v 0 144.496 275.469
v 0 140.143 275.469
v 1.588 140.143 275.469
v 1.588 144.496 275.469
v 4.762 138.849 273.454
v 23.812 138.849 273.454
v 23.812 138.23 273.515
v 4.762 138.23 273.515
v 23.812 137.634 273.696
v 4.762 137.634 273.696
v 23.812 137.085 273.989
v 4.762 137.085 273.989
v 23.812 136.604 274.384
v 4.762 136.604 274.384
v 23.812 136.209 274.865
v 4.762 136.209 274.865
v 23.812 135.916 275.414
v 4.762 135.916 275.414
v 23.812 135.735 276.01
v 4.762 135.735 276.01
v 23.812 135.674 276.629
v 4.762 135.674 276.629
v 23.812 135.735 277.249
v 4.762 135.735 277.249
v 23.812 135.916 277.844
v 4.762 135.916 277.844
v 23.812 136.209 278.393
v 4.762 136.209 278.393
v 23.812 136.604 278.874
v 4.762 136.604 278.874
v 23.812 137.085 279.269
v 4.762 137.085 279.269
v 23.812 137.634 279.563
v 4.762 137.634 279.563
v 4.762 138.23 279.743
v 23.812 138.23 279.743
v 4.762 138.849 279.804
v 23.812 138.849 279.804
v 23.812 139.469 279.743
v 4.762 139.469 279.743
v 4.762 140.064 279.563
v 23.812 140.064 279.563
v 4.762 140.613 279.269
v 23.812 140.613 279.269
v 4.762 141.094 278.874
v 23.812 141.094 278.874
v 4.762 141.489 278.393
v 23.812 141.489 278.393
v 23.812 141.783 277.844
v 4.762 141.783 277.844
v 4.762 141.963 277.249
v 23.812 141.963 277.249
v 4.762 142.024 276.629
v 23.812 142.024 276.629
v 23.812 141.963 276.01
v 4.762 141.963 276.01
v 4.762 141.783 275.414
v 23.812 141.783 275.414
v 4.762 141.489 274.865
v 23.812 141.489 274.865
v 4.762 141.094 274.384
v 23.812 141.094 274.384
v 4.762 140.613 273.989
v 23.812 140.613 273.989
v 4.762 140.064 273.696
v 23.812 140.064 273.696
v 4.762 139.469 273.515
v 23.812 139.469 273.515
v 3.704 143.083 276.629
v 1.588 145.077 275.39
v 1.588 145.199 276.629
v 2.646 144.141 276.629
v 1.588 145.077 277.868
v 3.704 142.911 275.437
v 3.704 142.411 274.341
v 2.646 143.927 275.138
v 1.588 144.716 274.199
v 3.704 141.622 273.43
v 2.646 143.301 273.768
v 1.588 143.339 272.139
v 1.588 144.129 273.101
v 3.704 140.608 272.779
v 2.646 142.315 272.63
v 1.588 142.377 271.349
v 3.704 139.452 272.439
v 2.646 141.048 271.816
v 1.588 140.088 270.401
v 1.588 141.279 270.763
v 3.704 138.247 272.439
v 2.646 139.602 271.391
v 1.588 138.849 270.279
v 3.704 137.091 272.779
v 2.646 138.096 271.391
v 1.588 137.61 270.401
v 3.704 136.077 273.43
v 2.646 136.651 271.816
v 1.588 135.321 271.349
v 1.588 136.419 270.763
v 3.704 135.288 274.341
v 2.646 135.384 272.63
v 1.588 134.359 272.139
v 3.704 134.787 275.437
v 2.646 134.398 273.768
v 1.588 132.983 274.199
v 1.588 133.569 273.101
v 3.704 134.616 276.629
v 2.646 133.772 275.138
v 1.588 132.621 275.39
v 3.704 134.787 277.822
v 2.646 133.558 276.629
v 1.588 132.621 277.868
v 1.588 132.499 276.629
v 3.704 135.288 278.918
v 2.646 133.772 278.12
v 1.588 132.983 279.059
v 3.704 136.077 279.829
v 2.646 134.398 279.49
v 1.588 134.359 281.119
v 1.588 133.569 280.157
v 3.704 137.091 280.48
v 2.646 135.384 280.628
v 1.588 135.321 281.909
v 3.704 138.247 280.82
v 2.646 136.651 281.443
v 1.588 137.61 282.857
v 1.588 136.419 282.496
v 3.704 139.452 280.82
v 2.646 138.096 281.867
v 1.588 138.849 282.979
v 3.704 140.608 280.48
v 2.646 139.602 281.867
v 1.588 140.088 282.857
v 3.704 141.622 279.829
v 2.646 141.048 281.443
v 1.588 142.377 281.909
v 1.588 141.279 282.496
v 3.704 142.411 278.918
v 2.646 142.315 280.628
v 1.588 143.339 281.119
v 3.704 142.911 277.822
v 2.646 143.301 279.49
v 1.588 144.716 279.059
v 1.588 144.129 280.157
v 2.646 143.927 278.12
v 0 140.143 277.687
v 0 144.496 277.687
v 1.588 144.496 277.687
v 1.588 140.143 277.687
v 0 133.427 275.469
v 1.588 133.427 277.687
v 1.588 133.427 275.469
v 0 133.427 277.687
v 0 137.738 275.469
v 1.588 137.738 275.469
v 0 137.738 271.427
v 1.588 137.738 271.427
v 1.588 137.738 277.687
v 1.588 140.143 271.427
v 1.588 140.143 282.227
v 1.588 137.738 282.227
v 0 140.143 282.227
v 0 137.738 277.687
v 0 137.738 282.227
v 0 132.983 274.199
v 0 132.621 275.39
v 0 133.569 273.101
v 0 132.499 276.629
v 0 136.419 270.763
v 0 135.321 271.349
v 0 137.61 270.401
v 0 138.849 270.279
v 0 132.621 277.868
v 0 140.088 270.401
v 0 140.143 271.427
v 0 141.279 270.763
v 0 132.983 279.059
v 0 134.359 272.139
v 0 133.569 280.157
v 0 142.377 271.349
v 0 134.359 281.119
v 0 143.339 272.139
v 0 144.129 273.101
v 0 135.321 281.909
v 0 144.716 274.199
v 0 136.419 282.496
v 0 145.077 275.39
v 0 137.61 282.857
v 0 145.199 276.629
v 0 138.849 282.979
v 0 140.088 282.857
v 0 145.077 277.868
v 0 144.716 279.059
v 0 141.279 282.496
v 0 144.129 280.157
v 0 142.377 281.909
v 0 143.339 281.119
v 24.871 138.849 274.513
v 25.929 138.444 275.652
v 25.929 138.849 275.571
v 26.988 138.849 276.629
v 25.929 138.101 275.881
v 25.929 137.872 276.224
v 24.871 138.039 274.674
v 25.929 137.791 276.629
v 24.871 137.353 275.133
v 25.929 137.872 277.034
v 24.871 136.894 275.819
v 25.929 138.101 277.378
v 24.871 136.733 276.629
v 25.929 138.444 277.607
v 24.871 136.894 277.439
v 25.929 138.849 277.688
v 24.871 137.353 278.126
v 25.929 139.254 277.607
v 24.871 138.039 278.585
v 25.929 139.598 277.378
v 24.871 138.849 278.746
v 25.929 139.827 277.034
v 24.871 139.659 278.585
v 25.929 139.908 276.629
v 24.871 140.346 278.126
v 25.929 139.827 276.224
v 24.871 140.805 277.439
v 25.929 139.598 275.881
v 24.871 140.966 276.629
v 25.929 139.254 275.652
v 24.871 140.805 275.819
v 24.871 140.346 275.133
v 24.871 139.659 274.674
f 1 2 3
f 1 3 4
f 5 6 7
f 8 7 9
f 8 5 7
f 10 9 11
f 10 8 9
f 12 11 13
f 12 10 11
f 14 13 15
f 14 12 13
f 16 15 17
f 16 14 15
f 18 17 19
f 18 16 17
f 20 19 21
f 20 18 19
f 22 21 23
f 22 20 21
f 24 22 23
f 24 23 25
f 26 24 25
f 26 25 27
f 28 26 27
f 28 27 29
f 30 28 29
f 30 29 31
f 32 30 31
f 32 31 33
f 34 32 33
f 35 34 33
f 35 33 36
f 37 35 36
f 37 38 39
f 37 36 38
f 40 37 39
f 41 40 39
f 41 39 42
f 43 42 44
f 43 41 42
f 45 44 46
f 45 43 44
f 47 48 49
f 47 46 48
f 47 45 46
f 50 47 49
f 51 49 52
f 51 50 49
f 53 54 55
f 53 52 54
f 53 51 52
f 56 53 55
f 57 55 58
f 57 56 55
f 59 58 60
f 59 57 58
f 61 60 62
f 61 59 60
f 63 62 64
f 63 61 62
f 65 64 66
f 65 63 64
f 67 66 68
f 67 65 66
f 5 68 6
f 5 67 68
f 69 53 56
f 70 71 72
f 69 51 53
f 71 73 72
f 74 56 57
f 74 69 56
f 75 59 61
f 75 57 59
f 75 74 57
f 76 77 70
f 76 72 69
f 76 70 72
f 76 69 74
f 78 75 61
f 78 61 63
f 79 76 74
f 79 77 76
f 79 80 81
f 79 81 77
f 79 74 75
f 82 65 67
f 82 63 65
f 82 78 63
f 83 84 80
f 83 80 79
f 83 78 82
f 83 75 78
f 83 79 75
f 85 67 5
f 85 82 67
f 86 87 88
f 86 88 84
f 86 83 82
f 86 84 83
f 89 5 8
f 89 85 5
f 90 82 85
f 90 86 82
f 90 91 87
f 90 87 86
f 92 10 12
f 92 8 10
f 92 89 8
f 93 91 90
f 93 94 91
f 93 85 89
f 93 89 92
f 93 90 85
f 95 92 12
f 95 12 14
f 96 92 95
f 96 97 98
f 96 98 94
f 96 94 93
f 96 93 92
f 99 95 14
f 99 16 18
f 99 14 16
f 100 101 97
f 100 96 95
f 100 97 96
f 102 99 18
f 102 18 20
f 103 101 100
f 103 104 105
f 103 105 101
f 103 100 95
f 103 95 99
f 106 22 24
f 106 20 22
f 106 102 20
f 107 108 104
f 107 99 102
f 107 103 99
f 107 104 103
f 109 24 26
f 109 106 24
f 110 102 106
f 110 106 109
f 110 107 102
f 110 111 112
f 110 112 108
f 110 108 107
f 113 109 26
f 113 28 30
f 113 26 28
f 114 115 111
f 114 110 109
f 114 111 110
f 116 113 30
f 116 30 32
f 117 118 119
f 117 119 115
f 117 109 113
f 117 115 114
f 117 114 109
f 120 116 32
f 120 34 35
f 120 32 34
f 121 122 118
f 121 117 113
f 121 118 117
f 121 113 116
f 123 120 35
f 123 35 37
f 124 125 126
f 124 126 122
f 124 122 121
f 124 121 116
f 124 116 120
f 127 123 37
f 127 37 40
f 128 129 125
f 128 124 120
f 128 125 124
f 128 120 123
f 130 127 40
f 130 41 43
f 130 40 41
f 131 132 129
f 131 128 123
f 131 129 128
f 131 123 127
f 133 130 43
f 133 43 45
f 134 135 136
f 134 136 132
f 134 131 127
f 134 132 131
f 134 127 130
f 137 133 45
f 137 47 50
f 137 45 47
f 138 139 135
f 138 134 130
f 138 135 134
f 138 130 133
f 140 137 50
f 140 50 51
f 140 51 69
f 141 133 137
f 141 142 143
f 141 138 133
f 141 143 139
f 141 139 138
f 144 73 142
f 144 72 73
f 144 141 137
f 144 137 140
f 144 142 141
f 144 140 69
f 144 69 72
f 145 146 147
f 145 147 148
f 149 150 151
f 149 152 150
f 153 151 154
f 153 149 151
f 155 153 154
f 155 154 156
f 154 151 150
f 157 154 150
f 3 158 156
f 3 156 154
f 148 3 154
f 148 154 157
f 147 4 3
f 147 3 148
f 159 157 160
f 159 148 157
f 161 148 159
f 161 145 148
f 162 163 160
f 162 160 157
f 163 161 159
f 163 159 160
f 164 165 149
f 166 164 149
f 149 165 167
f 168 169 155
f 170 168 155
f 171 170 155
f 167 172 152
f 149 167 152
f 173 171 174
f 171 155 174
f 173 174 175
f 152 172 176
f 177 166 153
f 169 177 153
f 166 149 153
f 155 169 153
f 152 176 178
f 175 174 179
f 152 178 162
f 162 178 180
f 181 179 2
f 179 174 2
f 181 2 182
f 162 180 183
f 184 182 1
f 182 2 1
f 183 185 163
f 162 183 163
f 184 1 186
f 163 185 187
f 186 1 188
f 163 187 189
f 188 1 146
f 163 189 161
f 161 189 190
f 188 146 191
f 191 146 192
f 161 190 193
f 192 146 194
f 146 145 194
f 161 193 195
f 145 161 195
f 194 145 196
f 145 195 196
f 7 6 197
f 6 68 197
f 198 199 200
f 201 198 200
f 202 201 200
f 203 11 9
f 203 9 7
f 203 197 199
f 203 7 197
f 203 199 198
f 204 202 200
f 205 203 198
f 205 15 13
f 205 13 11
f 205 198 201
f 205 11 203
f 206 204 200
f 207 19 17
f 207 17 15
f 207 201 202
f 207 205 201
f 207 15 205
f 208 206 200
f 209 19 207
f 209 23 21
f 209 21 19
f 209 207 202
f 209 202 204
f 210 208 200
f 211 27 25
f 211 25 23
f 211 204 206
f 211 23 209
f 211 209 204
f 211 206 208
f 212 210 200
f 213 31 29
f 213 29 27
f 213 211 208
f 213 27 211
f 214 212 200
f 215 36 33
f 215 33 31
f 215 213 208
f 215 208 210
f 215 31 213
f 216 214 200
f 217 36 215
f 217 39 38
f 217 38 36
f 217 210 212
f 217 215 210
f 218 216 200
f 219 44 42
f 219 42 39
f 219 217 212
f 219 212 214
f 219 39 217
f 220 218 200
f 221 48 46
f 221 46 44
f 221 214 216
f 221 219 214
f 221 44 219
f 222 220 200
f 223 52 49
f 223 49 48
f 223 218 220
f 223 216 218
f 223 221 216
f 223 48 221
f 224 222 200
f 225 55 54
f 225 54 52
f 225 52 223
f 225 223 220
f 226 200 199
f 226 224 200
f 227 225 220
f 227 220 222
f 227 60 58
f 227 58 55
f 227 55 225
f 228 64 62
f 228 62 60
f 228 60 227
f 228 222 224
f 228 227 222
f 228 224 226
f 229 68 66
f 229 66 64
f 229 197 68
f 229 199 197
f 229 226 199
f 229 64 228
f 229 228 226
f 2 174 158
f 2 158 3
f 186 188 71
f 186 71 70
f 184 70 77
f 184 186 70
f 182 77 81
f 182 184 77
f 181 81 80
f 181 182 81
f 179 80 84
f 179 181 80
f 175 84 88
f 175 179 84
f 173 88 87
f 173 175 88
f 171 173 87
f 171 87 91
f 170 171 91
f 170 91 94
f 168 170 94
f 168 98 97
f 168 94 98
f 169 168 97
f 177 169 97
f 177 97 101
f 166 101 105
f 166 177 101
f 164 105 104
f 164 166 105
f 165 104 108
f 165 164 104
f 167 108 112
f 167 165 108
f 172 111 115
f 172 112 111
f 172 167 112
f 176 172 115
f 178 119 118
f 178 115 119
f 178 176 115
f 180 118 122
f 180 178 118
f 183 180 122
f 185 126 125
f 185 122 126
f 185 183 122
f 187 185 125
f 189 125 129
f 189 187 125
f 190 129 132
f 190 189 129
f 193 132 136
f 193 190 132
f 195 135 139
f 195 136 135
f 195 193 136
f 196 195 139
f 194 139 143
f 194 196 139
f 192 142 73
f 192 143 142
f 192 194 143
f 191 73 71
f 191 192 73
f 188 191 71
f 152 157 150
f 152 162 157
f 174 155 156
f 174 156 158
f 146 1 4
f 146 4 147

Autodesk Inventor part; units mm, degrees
ref_plane "YZ Plane" through (0, 0, 0) normal (1, 0, 0) x (0, 1, 0)
ref_plane "XZ Plane" through (0, 0, 0) normal (0, 1, 0) x (-1, 0, 0)
ref_plane "XY Plane" through (0, 0, 0) normal (0, 0, 1) x (1, 0, 0)
sketch "Sketch1" plane through (0, 0, 0) normal (1, 0, 0) x (0, 1, 0)
  circle A0 centre (169.2255, 363.3555) radius 48.0965
  circle A1 centre (138.8493, 276.6293) radius 6.35
  point P0 (0, 0)
  dimension "d0" = 12.7
extrude "Extrusion1" add sketch "Sketch1" along normal blind 4.7625 contours A1
chamfer "Chamfer1" distance 3.175 angle 45 1 edges at (4.7625, 132.4993, 276.6293)
sketch "Sketch2" plane through (4.7625, 138.8493, 276.6293) normal (1, 0, 0) x (0, 0, -1)
  circle A0 centre (0, 0) radius 3.175 projected
  circle A1 centre (0, 0) radius 3.175
  point P0 (276.6293, -138.8493)
extrude "Extrusion2" add sketch "Sketch2" along normal blind 22.225
chamfer "Chamfer2" distance 3.175 angle 45 1 edges at (26.9875, 138.8493, 279.8043)
sketch "Sketch3" plane through (0, 138.8493, 276.6293) normal (-1, 0, 0) x (0, 0, 1)
  point P0 (-276.6293, -138.8493)
thread "Thread1" size "1/4-20 UNC" class "2A" standard "ANSI Unified Screw Threads" full length
sketch "Sketch4" plane through (0, 138.8493, 276.6293) normal (-1, 0, 0) x (0, 0, 1)
  line L0 (-1.16, 5.6468) -> (1.058, 5.6468)
  line L1 (1.058, 5.6468) -> (1.058, -5.4225)
  line L2 (1.058, -5.4225) -> (-1.16, -5.4225)
  line L3 (-1.16, -5.4225) -> (-1.16, 5.6468)
  line L4 (-5.2022, 1.2937) -> (5.5977, 1.2937)
  line L5 (5.5977, 1.2937) -> (5.5977, -1.1109)
  line L6 (5.5977, -1.1109) -> (-5.2022, -1.1109)
  line L7 (-5.2022, -1.1109) -> (-5.2022, 1.2937)
  point P0 (-276.6293, -138.8493)
extrude "Extrusion3" cut sketch "Sketch4" against normal blind 1.5875
properties part number "screw"
